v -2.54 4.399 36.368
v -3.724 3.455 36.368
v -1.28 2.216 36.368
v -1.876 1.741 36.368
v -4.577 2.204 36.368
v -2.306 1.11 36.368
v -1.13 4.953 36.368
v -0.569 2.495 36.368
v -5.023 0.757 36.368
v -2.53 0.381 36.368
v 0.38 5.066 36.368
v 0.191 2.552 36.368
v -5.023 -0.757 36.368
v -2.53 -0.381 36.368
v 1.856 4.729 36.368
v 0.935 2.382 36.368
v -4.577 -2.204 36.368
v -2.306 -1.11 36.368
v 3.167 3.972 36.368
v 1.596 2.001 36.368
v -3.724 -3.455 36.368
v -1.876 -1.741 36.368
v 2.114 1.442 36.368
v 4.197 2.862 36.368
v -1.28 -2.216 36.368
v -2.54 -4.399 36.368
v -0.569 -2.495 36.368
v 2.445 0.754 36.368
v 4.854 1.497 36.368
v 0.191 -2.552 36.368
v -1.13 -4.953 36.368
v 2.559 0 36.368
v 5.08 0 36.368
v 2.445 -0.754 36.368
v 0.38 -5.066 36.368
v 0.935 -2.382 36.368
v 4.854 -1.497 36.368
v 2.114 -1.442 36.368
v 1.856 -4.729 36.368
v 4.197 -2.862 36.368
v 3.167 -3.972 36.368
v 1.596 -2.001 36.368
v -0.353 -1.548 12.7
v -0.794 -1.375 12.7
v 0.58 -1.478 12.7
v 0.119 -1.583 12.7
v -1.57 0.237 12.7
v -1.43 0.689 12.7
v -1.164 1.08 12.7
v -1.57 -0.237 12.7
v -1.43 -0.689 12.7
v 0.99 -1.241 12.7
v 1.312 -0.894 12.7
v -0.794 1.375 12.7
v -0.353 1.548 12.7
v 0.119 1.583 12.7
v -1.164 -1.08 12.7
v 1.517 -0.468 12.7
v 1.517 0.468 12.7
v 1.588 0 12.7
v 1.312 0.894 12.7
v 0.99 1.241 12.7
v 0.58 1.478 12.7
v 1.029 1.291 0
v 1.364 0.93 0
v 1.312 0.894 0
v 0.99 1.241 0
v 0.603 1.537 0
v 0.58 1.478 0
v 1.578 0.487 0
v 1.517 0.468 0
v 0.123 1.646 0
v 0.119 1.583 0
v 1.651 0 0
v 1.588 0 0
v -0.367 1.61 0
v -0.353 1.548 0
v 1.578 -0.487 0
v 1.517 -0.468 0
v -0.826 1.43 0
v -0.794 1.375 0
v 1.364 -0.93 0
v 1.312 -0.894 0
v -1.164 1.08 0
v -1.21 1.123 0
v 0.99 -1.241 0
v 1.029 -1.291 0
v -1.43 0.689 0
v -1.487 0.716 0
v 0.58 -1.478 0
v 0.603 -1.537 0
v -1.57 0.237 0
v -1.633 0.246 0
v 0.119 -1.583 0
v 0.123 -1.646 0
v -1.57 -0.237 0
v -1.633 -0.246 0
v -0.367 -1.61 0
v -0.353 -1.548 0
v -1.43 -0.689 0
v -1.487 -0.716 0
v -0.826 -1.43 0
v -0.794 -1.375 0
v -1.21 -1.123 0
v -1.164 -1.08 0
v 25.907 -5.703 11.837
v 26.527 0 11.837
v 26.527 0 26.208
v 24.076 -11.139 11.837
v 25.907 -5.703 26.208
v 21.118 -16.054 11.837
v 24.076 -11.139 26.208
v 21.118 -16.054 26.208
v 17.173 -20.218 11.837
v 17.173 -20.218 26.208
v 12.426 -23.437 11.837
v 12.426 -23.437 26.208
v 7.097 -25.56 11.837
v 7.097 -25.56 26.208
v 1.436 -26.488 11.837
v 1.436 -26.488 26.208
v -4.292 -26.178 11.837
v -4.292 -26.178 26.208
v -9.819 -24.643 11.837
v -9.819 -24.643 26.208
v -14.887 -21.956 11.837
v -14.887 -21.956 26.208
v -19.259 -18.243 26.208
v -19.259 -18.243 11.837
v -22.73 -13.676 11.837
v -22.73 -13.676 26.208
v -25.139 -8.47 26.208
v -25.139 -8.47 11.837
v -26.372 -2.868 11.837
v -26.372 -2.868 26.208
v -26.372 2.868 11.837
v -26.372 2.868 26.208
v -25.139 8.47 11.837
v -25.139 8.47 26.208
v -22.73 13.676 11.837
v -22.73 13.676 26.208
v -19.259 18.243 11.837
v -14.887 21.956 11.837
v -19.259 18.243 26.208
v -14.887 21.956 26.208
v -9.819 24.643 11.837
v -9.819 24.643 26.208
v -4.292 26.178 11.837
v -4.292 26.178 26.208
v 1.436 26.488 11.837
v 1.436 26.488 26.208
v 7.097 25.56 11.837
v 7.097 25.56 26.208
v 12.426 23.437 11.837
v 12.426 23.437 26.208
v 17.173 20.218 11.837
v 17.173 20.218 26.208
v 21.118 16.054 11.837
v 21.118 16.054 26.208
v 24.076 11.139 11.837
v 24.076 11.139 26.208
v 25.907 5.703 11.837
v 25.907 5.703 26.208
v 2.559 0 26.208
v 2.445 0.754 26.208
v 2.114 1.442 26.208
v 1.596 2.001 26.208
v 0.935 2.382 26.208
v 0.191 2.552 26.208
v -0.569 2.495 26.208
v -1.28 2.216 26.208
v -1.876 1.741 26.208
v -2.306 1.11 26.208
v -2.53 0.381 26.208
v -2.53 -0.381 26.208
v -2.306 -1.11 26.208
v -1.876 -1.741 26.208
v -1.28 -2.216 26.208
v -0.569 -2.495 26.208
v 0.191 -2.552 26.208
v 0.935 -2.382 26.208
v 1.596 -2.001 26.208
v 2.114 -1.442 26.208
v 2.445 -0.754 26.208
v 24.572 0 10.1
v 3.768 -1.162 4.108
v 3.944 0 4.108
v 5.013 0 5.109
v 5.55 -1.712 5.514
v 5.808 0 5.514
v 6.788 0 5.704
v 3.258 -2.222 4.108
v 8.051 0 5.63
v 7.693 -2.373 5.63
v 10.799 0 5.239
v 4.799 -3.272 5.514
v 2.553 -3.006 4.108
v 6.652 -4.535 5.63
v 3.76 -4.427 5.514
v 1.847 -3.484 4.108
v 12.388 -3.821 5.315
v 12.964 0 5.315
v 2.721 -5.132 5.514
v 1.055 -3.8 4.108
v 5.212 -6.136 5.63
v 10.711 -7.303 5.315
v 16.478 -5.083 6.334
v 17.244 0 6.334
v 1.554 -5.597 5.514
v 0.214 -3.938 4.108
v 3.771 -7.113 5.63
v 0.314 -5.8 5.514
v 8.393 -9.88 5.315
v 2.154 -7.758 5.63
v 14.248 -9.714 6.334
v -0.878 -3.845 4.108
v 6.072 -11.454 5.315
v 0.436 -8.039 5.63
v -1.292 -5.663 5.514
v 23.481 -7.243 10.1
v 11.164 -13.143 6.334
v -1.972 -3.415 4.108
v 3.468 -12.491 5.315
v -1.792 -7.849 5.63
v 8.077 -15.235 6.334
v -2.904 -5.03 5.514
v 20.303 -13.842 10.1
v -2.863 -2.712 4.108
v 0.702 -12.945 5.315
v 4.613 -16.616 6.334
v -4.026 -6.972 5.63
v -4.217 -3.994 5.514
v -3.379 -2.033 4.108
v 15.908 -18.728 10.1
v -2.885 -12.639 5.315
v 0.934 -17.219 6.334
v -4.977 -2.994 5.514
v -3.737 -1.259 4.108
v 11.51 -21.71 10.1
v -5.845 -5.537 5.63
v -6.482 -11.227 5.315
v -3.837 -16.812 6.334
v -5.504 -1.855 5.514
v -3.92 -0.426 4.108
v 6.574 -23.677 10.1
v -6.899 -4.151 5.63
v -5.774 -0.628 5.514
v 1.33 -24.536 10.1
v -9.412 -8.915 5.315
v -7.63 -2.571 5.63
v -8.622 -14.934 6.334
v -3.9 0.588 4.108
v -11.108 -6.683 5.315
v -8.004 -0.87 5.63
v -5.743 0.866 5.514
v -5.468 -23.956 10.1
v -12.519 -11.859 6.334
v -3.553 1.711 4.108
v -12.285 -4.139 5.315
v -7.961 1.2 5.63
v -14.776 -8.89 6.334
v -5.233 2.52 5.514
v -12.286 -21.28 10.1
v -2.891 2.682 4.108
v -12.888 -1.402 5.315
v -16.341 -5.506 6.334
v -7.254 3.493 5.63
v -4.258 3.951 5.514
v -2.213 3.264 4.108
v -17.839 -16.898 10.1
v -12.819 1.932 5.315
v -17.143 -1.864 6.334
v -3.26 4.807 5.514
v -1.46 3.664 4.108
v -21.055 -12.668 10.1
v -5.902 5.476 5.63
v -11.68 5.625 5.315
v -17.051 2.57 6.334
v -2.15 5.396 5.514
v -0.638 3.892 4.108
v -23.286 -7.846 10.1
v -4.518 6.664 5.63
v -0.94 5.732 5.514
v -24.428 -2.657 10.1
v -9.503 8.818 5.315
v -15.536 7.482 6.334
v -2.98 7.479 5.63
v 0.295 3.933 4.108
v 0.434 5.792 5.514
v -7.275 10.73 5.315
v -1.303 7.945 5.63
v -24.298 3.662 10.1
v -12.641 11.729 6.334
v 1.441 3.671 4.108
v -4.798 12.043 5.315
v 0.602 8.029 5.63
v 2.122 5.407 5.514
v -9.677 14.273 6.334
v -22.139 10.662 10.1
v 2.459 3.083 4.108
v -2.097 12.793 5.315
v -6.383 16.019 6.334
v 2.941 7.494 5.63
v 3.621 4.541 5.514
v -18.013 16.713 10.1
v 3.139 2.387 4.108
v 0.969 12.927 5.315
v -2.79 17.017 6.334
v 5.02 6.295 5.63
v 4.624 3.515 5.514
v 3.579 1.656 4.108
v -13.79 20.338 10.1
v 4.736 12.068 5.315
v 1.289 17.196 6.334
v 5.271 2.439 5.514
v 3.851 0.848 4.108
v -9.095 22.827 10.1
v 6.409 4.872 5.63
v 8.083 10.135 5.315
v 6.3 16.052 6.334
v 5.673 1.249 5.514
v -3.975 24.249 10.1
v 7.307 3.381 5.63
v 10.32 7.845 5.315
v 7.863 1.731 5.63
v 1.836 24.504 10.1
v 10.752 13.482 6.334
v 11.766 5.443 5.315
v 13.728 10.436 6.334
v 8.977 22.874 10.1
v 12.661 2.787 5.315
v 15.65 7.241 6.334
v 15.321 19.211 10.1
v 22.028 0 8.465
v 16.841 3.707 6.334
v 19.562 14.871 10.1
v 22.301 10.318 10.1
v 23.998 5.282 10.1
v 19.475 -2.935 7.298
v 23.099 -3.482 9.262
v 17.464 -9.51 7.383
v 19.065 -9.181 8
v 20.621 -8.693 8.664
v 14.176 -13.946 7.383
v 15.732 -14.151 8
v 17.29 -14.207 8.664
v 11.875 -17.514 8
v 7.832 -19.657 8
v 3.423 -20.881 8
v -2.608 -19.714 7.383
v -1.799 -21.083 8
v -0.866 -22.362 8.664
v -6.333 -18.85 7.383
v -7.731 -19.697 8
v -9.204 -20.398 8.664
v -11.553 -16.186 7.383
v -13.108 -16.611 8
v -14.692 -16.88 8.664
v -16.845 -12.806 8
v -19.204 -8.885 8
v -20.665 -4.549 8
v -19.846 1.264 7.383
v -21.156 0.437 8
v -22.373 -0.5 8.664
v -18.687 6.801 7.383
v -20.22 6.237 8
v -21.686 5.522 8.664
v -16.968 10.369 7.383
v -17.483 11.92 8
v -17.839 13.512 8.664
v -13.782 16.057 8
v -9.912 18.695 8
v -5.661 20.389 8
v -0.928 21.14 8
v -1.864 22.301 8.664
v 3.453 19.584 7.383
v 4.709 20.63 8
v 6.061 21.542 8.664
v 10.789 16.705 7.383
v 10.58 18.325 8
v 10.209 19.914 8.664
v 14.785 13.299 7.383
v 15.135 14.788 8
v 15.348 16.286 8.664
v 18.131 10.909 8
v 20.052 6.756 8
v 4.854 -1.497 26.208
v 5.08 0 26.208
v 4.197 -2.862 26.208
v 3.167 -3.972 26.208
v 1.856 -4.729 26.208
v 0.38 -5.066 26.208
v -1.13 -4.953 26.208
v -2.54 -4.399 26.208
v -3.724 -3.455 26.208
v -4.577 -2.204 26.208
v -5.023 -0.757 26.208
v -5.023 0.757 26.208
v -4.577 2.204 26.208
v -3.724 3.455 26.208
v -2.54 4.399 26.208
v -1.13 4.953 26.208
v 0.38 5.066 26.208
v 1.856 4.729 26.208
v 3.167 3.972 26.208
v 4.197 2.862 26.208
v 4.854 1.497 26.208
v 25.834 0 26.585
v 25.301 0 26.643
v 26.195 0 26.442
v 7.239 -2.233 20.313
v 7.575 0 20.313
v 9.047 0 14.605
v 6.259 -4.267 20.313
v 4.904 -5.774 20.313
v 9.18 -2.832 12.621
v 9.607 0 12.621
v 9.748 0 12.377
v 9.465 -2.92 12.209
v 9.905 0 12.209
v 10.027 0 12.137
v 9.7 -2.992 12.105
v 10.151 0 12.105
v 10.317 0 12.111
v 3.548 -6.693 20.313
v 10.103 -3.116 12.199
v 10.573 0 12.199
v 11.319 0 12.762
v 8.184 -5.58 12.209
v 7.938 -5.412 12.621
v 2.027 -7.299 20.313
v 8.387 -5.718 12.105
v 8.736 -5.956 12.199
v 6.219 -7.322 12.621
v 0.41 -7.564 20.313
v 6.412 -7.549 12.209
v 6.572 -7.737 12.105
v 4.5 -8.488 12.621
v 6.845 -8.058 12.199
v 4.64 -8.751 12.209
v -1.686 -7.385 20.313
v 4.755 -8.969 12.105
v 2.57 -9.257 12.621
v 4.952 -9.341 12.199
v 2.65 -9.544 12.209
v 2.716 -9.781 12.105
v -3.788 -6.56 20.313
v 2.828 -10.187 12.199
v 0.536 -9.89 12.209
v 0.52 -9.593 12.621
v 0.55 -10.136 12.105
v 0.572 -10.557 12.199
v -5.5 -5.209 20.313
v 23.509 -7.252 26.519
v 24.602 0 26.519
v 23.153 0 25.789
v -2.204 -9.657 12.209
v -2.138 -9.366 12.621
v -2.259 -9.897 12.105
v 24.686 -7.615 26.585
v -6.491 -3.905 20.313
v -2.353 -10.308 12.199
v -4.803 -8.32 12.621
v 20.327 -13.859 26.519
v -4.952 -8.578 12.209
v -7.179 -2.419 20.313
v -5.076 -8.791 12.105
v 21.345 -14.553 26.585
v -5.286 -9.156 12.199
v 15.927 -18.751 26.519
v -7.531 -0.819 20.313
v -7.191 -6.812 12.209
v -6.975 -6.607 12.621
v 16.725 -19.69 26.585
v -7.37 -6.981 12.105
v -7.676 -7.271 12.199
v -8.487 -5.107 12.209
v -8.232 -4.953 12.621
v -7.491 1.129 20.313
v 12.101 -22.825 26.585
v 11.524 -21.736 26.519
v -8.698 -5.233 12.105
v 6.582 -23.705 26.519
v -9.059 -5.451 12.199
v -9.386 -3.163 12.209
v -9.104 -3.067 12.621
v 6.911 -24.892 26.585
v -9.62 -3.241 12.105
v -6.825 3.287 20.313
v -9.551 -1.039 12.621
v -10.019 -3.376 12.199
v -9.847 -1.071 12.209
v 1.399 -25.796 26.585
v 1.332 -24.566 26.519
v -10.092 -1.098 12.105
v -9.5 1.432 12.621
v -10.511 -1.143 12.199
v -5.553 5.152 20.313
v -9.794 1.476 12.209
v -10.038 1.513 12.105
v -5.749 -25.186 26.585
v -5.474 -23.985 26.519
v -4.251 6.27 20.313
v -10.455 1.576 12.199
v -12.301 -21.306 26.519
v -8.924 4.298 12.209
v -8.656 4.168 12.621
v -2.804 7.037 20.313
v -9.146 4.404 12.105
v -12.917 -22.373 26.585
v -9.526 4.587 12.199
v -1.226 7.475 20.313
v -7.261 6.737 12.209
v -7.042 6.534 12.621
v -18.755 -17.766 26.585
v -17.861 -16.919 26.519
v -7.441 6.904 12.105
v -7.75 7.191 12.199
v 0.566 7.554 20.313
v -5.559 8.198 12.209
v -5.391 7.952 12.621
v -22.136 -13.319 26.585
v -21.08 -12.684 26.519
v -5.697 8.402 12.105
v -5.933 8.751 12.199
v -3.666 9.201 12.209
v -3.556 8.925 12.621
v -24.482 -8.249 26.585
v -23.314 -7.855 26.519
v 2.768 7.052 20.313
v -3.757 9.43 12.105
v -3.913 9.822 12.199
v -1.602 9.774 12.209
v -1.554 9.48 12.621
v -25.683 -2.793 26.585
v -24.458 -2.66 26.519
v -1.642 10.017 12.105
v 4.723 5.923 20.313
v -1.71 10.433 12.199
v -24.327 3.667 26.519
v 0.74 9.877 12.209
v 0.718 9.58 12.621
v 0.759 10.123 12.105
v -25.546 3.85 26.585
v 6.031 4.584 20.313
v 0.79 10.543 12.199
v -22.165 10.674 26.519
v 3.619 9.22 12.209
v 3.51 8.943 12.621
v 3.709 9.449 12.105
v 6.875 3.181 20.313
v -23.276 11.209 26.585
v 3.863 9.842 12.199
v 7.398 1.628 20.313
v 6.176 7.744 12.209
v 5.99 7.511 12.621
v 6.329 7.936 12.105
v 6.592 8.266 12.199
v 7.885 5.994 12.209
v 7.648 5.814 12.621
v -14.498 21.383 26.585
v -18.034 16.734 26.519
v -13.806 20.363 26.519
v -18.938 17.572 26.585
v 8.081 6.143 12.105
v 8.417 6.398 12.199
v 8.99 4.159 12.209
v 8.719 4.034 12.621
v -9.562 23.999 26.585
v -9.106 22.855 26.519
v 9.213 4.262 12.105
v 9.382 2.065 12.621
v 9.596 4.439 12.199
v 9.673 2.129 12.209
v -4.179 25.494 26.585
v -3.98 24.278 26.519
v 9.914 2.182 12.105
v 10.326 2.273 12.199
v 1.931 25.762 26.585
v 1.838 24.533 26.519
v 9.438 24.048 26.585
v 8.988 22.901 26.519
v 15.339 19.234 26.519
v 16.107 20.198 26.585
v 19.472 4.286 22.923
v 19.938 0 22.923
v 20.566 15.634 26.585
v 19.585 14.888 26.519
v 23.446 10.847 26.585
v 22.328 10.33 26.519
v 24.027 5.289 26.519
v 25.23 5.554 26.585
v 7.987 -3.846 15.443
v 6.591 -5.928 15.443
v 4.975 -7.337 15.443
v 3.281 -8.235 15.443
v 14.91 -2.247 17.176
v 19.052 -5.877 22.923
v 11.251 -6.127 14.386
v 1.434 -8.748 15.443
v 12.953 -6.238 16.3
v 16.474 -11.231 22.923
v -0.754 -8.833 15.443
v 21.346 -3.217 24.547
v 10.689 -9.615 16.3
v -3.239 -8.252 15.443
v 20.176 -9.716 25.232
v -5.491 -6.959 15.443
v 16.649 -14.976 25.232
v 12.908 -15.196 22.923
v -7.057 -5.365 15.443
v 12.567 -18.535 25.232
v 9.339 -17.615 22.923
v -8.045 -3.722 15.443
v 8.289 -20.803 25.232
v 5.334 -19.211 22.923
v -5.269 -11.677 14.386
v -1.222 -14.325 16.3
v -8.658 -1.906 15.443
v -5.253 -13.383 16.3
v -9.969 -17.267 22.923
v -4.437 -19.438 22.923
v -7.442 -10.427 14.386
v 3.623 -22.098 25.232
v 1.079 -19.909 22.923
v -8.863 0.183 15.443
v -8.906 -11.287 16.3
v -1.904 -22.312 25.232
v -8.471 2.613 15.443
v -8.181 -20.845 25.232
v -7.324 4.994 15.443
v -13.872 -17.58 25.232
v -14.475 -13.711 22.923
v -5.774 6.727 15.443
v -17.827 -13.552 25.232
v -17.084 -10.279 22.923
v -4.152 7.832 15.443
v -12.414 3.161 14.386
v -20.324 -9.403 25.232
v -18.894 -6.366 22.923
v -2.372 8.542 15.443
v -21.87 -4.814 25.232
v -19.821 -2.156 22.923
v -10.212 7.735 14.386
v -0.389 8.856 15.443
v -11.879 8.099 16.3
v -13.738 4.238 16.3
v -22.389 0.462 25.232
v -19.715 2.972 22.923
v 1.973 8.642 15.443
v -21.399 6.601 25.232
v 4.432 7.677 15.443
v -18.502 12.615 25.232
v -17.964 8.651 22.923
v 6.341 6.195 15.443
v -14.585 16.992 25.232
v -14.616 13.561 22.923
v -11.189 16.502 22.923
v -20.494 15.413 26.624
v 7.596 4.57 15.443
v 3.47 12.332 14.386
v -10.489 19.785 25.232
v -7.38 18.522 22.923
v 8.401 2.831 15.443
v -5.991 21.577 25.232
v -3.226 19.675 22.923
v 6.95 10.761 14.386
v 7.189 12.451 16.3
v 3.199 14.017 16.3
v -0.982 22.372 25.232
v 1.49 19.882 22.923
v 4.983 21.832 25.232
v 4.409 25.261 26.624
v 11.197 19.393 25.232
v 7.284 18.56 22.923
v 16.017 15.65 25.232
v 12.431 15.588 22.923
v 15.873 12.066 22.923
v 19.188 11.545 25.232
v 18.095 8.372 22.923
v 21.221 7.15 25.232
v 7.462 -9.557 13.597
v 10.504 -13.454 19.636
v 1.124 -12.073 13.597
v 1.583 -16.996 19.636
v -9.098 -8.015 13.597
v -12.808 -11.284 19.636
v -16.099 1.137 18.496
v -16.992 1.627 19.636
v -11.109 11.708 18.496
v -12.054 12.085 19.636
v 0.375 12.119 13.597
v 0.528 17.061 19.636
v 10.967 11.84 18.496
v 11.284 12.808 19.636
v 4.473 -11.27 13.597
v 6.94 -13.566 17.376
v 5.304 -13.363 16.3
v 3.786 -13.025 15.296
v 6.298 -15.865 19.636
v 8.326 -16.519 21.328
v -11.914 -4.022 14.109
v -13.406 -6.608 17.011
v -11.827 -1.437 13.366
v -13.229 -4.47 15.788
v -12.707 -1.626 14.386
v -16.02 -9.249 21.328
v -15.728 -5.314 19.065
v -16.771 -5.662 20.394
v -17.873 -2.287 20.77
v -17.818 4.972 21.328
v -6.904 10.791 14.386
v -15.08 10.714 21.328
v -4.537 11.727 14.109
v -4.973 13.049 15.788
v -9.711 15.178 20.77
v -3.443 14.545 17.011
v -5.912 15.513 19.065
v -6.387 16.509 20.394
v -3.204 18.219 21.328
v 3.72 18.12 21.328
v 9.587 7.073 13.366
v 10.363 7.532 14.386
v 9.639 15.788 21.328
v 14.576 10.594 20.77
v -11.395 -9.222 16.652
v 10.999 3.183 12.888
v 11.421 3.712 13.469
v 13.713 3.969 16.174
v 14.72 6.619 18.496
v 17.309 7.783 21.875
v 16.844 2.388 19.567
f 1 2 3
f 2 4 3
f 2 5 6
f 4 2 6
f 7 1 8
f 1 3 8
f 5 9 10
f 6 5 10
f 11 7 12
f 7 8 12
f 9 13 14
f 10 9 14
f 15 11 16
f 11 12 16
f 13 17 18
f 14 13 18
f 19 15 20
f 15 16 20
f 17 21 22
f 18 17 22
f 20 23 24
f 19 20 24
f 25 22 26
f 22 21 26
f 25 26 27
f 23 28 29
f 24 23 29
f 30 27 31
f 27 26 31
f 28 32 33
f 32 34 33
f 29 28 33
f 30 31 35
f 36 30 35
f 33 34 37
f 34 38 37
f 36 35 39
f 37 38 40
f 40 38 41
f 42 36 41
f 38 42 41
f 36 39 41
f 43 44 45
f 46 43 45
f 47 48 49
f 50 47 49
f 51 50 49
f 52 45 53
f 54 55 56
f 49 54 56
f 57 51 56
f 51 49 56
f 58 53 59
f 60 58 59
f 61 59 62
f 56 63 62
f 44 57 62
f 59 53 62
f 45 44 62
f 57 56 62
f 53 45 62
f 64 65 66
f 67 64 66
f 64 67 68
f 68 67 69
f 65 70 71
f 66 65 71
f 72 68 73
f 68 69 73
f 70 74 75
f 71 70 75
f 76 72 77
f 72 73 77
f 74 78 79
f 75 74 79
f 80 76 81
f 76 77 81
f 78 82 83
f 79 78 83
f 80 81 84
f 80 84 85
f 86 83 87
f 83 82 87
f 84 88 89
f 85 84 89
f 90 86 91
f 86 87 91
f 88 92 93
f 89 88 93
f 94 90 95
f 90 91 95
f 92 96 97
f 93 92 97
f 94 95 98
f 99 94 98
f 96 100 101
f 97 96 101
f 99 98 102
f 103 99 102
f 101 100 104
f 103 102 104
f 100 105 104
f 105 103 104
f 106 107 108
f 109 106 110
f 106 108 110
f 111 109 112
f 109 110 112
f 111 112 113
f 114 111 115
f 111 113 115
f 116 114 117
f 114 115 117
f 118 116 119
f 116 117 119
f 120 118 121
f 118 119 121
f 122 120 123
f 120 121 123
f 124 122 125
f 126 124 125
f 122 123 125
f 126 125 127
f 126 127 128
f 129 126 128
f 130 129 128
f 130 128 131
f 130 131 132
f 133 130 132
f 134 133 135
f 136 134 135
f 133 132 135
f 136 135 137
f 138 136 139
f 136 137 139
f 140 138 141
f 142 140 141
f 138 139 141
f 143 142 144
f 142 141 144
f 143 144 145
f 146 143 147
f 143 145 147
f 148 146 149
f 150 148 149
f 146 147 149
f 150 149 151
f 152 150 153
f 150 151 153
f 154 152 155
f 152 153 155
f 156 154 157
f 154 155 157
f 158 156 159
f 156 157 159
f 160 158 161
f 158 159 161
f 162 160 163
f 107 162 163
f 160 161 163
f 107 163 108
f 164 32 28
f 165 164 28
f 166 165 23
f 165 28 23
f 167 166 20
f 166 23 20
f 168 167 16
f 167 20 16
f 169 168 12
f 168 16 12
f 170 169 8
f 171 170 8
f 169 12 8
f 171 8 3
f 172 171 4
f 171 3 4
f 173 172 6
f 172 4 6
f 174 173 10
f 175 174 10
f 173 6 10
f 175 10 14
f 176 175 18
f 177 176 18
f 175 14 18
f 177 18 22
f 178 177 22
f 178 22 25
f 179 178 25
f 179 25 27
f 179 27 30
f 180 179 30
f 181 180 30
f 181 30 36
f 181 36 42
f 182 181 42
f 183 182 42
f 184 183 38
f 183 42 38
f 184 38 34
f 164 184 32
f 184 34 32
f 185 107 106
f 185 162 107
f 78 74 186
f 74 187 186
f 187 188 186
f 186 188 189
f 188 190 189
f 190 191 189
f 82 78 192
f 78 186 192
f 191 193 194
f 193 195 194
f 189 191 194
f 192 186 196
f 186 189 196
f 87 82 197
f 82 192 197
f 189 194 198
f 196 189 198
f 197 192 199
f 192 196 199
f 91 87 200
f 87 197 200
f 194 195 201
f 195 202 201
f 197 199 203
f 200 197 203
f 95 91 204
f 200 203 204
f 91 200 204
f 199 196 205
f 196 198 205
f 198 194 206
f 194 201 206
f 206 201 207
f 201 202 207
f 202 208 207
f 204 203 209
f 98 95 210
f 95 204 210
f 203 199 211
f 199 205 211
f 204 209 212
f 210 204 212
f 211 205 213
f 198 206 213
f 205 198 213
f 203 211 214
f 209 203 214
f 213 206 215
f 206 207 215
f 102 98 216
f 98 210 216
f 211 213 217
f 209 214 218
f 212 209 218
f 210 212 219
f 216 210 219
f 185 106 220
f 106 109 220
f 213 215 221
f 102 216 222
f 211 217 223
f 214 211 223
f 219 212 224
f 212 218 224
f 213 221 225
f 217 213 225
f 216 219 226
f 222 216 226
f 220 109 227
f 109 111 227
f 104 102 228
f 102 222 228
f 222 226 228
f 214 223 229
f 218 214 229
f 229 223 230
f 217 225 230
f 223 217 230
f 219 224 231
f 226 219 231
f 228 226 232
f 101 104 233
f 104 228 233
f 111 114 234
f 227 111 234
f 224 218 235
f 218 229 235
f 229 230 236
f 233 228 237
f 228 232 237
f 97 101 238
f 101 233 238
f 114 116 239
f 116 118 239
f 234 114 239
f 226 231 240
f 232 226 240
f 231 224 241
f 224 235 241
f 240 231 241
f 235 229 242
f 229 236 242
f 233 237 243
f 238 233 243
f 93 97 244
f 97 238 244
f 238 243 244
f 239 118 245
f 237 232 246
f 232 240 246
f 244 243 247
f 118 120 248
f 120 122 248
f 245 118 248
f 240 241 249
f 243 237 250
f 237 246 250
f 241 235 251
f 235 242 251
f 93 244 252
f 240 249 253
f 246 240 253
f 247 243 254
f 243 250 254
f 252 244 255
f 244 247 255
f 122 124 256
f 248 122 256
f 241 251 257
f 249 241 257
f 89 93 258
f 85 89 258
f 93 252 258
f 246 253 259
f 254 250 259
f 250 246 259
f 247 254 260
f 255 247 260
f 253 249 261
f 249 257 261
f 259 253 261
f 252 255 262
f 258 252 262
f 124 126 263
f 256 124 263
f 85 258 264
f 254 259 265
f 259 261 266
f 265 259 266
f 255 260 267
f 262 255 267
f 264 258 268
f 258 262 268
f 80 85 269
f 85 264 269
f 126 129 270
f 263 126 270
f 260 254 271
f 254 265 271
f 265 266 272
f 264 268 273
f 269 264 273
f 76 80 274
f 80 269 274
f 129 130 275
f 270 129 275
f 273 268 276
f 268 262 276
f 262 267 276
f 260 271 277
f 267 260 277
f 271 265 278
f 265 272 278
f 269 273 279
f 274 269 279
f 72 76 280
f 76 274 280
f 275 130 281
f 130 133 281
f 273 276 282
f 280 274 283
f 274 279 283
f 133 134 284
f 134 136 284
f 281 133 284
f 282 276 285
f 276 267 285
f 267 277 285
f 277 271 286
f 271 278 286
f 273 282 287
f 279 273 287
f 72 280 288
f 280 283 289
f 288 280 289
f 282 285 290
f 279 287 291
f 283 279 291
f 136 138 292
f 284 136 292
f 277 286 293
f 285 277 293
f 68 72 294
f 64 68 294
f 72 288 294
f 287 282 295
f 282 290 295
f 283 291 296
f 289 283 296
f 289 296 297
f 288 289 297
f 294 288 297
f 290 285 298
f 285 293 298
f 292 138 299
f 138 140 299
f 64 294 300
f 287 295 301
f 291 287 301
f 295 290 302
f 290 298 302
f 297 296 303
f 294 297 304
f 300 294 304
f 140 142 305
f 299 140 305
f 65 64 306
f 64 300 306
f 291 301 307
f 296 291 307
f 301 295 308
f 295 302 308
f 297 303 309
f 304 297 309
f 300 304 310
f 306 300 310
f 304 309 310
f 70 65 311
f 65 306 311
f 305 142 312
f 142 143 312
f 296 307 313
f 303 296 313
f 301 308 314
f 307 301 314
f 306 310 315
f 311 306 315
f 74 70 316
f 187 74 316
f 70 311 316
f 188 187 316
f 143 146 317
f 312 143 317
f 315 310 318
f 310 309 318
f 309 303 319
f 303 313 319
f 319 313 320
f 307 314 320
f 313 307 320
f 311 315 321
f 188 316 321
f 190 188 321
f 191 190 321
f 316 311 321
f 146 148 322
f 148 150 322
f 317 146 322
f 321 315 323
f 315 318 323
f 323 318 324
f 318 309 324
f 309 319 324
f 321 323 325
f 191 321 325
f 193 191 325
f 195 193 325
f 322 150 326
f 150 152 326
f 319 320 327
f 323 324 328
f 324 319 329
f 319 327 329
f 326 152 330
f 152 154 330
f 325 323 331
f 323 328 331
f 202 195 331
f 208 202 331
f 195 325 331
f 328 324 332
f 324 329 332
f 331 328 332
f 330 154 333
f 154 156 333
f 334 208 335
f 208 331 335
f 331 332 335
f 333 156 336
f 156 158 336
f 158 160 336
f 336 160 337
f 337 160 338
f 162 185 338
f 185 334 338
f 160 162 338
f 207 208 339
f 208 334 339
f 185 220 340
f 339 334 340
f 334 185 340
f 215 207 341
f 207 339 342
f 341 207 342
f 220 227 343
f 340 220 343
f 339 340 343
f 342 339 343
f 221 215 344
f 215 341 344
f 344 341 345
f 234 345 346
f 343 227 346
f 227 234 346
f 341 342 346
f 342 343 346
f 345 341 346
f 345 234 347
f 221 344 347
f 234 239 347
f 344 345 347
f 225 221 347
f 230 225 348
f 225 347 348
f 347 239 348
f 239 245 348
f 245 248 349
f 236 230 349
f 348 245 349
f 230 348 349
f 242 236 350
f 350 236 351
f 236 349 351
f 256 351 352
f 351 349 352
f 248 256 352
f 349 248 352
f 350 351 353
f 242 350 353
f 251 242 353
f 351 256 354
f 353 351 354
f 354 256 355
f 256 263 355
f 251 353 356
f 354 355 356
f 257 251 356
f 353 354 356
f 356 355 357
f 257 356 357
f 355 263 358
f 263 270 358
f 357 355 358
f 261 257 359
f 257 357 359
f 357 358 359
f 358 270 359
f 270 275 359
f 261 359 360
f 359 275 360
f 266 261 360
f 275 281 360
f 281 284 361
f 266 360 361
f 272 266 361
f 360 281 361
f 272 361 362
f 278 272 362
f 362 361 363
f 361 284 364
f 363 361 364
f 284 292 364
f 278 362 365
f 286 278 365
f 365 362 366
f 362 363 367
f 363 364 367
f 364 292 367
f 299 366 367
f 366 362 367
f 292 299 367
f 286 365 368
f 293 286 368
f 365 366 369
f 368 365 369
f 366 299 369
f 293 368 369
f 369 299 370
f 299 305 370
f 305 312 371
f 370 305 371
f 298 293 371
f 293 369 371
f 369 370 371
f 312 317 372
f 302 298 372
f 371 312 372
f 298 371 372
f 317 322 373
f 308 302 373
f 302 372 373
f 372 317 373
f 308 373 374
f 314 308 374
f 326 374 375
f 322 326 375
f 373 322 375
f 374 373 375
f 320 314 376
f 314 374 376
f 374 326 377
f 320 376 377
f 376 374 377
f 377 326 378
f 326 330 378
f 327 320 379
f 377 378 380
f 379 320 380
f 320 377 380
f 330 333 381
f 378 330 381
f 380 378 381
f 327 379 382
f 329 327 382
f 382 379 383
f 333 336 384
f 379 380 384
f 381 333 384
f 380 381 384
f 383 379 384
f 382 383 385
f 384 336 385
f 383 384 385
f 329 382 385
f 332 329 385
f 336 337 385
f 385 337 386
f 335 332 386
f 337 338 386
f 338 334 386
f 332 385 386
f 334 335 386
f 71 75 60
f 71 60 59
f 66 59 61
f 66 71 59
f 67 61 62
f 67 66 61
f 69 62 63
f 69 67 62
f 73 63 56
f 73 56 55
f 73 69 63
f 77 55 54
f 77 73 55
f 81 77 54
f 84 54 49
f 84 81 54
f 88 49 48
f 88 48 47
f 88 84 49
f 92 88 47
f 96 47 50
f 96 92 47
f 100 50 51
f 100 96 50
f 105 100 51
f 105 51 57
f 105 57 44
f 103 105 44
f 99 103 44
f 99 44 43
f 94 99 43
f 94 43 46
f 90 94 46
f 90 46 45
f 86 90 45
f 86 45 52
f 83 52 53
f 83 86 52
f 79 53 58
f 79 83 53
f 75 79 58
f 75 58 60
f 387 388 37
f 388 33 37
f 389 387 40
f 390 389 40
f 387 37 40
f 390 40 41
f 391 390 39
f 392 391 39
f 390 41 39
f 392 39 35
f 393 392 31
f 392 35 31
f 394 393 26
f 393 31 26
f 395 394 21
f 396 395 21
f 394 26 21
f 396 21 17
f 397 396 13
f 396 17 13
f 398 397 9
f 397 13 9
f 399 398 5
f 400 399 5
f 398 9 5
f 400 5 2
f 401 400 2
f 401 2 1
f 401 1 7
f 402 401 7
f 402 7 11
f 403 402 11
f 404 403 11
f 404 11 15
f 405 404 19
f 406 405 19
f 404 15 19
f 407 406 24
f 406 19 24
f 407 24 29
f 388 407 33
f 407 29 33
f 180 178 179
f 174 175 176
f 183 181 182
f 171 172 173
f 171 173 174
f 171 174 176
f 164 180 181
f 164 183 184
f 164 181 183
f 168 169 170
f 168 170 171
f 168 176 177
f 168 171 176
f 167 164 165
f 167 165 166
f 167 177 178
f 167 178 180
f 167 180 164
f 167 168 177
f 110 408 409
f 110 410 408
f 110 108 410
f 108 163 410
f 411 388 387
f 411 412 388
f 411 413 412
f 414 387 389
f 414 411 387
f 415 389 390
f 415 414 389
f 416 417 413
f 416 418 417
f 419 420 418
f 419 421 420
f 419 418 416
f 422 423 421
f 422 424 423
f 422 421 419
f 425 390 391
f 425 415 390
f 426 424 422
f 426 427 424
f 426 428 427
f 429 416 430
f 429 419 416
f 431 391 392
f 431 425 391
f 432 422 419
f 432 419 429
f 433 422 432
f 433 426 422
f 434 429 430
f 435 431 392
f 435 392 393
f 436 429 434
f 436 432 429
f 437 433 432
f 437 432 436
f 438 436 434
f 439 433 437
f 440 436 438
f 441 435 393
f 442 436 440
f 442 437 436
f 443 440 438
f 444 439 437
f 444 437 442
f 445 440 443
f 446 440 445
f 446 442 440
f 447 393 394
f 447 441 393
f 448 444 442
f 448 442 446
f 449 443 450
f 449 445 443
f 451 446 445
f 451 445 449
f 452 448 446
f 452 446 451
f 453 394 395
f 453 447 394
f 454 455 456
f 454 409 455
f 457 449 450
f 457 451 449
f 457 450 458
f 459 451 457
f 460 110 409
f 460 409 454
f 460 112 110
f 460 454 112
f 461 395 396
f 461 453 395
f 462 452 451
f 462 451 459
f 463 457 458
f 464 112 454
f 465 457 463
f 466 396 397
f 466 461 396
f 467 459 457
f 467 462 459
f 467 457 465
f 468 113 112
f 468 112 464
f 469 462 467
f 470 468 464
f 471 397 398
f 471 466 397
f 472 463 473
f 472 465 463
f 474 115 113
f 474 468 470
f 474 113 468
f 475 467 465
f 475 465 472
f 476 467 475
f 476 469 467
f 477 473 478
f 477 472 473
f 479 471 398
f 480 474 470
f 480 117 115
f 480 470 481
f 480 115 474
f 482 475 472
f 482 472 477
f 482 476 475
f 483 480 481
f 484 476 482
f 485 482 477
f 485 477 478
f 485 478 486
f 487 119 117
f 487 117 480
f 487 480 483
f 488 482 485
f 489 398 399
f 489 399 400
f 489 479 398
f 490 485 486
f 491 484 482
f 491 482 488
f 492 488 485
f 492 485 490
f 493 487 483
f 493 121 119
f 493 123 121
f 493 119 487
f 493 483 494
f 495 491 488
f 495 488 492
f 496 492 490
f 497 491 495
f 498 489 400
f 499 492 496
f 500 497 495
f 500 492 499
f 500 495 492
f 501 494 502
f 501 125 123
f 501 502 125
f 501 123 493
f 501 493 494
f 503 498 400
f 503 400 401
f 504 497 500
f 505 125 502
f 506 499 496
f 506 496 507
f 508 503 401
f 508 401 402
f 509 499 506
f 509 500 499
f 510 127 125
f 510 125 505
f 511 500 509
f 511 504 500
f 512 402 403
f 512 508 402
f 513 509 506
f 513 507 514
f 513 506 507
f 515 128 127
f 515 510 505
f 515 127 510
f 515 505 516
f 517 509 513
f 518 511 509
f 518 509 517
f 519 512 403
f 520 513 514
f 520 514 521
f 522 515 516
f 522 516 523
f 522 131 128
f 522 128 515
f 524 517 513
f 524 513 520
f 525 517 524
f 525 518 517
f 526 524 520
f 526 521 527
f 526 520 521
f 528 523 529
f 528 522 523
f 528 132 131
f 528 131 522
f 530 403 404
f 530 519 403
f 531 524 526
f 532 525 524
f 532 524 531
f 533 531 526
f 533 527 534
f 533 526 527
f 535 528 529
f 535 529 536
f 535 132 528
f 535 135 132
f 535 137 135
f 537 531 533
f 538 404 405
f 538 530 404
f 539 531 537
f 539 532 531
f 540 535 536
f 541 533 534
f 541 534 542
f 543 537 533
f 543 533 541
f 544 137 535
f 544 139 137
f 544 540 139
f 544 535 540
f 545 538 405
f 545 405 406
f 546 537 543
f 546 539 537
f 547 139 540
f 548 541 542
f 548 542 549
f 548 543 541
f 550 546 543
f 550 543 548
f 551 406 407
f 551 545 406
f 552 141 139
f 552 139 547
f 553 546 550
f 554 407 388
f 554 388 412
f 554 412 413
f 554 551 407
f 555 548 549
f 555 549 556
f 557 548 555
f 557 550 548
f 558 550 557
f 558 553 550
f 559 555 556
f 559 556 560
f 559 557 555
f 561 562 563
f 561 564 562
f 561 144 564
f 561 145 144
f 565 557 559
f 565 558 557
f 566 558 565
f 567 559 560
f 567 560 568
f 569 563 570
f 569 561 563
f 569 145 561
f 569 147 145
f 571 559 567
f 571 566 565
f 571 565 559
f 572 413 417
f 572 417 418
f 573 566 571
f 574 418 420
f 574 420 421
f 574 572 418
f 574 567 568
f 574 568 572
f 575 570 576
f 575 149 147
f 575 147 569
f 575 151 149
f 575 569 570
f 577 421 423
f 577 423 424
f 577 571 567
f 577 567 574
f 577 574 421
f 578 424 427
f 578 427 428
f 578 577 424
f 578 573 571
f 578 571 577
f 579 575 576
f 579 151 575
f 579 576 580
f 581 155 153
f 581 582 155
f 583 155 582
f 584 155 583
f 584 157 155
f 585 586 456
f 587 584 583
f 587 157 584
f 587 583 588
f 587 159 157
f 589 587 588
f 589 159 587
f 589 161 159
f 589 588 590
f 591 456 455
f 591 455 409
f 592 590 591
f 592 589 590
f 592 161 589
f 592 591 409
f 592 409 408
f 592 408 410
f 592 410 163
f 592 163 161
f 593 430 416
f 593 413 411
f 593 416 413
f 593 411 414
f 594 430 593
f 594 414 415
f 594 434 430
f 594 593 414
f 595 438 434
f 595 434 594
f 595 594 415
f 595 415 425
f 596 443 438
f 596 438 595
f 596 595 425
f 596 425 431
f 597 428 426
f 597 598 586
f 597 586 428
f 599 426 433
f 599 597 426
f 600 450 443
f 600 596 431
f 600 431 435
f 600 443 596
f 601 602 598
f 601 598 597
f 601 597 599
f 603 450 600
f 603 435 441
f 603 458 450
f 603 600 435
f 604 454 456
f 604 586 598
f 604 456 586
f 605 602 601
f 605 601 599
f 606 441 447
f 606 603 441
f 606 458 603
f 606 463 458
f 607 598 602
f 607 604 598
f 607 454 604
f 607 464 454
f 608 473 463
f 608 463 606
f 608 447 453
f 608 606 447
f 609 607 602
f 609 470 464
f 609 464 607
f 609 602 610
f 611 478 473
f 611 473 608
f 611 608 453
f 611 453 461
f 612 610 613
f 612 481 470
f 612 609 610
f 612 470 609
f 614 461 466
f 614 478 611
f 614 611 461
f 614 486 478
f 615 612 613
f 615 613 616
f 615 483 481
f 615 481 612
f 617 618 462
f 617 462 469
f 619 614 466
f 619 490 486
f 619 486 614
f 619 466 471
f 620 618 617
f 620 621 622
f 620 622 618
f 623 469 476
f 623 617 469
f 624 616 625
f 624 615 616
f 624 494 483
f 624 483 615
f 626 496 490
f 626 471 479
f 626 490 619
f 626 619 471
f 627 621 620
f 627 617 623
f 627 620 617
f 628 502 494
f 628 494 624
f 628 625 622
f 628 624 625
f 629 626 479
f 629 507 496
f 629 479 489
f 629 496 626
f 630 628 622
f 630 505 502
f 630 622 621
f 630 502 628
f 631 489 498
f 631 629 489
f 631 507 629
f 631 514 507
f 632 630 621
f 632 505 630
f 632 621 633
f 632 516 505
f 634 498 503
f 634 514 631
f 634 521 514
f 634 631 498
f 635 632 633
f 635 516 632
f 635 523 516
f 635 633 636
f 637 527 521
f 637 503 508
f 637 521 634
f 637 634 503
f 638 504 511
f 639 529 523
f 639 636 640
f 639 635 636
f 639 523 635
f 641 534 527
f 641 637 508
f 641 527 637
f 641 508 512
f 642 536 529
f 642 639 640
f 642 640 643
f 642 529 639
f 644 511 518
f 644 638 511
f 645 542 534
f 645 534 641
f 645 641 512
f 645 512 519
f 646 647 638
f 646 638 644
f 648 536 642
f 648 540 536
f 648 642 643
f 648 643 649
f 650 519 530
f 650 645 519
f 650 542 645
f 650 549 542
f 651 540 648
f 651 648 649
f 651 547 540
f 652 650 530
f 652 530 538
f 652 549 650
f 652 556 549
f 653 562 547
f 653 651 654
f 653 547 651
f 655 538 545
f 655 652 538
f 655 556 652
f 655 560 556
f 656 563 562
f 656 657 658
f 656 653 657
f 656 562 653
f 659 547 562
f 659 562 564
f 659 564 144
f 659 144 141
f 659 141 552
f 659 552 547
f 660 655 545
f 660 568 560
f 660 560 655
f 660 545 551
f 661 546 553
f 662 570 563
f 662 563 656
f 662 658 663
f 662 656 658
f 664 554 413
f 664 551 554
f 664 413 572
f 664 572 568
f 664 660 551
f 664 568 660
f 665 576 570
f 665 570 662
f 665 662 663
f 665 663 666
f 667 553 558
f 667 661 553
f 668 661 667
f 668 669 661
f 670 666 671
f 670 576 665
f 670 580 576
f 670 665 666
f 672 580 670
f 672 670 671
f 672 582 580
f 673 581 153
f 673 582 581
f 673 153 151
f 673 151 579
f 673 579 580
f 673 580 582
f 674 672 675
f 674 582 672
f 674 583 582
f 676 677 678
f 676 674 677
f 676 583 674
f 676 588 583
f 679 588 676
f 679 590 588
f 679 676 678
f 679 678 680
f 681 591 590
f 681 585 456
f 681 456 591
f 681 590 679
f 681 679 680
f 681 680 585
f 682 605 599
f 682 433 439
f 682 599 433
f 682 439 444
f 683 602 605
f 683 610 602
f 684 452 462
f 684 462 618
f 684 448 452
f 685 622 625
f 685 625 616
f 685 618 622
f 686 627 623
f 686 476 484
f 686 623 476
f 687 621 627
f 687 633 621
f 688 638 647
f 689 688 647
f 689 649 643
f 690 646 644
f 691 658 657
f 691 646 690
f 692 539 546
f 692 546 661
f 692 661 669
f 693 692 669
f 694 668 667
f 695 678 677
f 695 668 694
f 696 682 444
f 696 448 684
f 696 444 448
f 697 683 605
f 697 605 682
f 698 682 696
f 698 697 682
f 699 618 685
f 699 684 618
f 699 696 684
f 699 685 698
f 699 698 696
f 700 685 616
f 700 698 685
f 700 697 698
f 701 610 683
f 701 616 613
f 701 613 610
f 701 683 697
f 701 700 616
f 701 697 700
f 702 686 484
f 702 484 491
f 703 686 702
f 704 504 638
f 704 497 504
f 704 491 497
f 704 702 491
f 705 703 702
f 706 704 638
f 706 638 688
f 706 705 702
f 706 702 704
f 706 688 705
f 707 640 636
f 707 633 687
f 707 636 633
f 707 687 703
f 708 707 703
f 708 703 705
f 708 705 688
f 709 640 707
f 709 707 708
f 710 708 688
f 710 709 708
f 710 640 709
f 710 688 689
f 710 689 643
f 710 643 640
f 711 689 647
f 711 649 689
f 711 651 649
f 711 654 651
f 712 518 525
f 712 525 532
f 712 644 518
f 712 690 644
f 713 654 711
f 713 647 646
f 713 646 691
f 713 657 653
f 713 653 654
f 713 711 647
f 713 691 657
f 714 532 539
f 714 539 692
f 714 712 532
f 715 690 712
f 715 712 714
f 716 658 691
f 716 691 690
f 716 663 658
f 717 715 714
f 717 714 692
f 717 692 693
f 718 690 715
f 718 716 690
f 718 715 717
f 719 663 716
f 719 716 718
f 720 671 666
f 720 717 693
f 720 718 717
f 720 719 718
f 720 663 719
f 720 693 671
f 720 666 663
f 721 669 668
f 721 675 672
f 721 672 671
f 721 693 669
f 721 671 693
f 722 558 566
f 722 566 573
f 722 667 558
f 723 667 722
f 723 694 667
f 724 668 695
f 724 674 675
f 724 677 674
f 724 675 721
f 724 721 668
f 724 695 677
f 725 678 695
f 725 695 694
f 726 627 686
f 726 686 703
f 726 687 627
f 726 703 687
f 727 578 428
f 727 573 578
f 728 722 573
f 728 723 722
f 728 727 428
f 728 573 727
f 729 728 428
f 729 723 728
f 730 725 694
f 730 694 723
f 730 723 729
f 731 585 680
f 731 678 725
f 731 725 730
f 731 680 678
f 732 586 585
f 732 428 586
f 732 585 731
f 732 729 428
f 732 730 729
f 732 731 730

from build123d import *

# Parameters (mm, degrees)
F2_R     = 2.5590732694
F3_DEPTH = 10.16
F4_R     = 1.5875
F5_DEPTH = 12.7


with BuildPart() as f1:
    # F0 (on Front) → F1 (revolve)
    with BuildSketch(Plane.XZ):
        with BuildLine():
            Line((0, 36.3681837916), (0, 0))
            Line((0, 0), (1.651, 0))
            add(Edge.make_bspline(
                [(1.651, 0), (4.9784278335, 7.8432246905), (9.8797152031, 2.2916243739), (23.4813746273, 8.4736508016), (26.5273787081, 11.8374861777)],
                knots=[0, 0, 0, 0, 0.4442566338, 1, 1, 1, 1], degree=3))
            Line((26.5273787081, 11.8374861777), (26.5273787081, 26.2081837916))
            add(Edge.make_bspline(
                [(5.08, 26.2081837916), (10.0801282924, 16.6757298148), (6.5290390026, 2.9534107183), (23.0302548553, 29.295393126), (26.5273787081, 26.2081837916)],
                knots=[0, 0, 0, 0, 0.4594912223, 1, 1, 1, 1], degree=3))
            Line((5.08, 26.2081837916), (5.08, 36.3681837916))
            Line((5.08, 36.3681837916), (0, 36.3681837916))
        make_face()
    revolve(axis=Axis((0, 0, 18.1840918958), (0, 0, -1)))

    # F2 (on face) → F3 (cut)
    with BuildSketch(Plane.XY.offset(36.3681837916)):
        Circle(F2_R)
    extrude(amount=-F3_DEPTH, mode=Mode.SUBTRACT)

    # F4 (on Top) → F5 (cut)
    with BuildSketch(Plane.XY):
        Circle(F4_R)
    extrude(amount=F5_DEPTH, mode=Mode.SUBTRACT)


solid = f1.part
